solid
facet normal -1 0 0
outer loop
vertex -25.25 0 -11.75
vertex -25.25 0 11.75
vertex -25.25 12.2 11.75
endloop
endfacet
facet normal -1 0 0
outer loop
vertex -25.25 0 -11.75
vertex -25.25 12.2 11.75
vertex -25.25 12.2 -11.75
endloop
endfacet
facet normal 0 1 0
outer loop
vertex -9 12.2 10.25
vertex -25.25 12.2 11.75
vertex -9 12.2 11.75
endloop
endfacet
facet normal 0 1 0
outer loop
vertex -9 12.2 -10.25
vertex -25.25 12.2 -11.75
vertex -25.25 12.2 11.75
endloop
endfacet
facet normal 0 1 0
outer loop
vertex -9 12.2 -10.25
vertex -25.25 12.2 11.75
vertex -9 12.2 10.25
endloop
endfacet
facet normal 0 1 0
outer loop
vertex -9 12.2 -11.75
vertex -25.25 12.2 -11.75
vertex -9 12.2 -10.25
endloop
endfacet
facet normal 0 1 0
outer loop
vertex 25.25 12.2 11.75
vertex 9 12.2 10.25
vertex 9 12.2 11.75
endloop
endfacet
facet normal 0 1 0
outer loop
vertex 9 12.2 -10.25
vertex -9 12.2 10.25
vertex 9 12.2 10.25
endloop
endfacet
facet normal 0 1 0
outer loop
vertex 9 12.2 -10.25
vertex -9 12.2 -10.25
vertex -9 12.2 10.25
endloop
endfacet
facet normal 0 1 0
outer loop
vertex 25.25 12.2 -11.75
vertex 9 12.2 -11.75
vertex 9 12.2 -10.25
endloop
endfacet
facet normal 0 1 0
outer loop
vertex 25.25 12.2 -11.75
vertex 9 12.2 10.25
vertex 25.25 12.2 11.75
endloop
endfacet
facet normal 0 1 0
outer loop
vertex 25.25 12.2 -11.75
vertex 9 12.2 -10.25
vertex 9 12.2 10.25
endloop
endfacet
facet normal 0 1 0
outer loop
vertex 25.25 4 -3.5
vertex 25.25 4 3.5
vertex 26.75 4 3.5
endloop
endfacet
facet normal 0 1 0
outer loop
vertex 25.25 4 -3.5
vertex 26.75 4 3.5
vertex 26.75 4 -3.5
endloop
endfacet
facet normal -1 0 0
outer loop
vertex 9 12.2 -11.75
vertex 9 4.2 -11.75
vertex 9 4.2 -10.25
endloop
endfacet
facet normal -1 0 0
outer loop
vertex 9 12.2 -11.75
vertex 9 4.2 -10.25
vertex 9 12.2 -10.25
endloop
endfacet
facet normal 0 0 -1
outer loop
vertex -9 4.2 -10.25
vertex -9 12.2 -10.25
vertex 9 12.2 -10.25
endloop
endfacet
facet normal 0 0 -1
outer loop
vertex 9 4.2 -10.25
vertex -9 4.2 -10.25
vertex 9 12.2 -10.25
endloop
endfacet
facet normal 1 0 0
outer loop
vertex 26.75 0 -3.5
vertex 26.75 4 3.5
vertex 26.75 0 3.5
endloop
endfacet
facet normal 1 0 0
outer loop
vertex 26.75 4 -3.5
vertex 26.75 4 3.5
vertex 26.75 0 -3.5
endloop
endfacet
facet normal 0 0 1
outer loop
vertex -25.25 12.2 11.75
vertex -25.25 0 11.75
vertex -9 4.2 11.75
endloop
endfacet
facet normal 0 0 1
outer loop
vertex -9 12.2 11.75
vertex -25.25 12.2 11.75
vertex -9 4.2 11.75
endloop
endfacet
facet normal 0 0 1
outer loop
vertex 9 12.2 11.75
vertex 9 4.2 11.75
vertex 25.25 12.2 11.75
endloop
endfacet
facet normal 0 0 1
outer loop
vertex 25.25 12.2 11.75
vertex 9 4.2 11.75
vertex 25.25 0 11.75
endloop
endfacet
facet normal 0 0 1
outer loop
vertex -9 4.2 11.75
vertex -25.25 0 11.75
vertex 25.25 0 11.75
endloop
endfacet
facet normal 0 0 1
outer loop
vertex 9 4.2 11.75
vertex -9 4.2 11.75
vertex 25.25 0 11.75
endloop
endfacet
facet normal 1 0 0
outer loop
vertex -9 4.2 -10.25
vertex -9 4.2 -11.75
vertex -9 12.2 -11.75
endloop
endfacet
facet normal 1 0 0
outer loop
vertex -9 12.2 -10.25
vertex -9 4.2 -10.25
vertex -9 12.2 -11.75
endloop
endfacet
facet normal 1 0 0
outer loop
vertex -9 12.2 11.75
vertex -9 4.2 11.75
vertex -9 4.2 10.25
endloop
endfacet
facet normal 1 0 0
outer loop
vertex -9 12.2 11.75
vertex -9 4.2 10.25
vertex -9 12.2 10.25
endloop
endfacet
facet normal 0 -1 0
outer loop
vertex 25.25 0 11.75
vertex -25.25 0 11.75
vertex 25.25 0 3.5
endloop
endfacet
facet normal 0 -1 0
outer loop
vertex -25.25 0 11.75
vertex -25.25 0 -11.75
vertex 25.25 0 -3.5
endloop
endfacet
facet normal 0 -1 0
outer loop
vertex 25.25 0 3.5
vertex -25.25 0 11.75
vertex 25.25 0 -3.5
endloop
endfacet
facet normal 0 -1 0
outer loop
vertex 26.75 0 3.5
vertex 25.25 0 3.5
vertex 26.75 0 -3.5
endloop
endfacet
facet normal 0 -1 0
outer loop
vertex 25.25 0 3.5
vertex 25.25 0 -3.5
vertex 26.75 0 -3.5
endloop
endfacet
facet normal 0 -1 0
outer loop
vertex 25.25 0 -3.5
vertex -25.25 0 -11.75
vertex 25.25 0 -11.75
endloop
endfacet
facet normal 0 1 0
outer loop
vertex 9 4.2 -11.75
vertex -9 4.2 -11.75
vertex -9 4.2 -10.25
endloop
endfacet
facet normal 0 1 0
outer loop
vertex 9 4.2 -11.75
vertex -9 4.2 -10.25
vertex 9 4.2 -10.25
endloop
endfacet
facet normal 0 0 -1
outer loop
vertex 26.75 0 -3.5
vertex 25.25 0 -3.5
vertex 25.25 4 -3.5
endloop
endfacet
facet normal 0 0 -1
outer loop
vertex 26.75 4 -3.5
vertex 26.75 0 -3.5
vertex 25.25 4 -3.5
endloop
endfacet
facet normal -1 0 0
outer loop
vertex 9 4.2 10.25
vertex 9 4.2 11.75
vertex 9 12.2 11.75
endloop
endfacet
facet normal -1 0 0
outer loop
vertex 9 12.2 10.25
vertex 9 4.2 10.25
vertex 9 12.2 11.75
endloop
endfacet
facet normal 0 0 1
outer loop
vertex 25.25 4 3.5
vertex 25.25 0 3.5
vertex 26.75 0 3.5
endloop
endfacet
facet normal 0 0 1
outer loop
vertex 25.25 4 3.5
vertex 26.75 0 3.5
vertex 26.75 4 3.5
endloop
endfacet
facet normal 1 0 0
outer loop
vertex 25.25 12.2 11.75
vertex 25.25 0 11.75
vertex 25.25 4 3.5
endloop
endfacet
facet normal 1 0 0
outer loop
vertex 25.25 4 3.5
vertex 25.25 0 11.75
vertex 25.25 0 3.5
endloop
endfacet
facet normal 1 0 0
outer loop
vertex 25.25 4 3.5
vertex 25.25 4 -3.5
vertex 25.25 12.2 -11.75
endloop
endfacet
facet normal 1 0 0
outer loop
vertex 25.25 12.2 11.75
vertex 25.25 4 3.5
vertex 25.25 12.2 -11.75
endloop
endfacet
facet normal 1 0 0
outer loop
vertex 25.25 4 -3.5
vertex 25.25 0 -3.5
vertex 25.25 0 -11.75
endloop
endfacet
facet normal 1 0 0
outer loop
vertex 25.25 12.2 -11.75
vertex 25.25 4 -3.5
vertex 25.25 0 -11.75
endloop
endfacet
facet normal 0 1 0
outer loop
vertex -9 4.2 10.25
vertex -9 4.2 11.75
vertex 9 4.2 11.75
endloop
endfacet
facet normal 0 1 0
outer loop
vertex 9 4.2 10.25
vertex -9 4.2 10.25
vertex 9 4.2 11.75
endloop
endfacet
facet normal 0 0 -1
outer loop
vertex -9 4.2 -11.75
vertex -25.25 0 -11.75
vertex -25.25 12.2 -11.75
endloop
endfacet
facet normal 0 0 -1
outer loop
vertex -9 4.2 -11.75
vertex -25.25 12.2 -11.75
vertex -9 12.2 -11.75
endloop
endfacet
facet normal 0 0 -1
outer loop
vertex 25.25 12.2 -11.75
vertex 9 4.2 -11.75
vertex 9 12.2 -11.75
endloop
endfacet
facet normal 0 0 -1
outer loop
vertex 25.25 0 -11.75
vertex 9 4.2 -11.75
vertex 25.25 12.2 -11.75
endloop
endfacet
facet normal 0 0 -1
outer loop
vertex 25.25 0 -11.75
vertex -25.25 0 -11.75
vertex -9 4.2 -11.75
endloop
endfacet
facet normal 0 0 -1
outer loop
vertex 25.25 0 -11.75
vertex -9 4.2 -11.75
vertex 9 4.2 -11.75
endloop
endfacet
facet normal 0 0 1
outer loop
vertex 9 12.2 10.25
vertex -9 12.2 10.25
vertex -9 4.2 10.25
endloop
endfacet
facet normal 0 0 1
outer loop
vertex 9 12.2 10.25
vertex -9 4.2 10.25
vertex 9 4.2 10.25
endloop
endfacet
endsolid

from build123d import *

# Parameters (mm, degrees)
SKETCH_1_W          = 50.5
SKETCH_1_H          = 23.5
EXTRUDE_1_DEPTH     = 12.2
SKETCH_2_W          = 7
SKETCH_2_H          = 4
EXTRUDE_2_DEPTH     = 1.5
SKETCH_3_W          = 18
SKETCH_3_H          = 8
CUT_EXTRUDE_1_DEPTH = 1.5


with BuildPart() as part:
    # Эскиз1 → Бобышка-Вытянуть1 (new body)
    with BuildSketch(Plane(origin=(0, 0, 0), x_dir=(1, 0, 0), z_dir=(0, 1, 0))):
        Rectangle(SKETCH_1_W, SKETCH_1_H)
    extrude(amount=EXTRUDE_1_DEPTH)

    # Эскиз2 → Бобышка-Вытянуть2 (add)
    with BuildSketch(Plane(origin=(25.25, 0, 0), x_dir=(0, 0, -1), z_dir=(1, 0, 0))):
        with Locations((0, 2)):
            Rectangle(SKETCH_2_W, SKETCH_2_H)
    extrude(amount=EXTRUDE_2_DEPTH)

    # Эскиз3 → Вырез-Вытянуть1 (cut)
    with BuildSketch(Plane.XY.offset(11.75)):
        with Locations((0, 8.2)):
            Rectangle(SKETCH_3_W, SKETCH_3_H)
    cut_extrude_1 = extrude(amount=-CUT_EXTRUDE_1_DEPTH, mode=Mode.SUBTRACT)

    # Зеркальное отражение1: Вырез-Вытянуть1 across plane
    add(cut_extrude_1.mirror(Plane.XY), mode=Mode.SUBTRACT)


solid = part.part
